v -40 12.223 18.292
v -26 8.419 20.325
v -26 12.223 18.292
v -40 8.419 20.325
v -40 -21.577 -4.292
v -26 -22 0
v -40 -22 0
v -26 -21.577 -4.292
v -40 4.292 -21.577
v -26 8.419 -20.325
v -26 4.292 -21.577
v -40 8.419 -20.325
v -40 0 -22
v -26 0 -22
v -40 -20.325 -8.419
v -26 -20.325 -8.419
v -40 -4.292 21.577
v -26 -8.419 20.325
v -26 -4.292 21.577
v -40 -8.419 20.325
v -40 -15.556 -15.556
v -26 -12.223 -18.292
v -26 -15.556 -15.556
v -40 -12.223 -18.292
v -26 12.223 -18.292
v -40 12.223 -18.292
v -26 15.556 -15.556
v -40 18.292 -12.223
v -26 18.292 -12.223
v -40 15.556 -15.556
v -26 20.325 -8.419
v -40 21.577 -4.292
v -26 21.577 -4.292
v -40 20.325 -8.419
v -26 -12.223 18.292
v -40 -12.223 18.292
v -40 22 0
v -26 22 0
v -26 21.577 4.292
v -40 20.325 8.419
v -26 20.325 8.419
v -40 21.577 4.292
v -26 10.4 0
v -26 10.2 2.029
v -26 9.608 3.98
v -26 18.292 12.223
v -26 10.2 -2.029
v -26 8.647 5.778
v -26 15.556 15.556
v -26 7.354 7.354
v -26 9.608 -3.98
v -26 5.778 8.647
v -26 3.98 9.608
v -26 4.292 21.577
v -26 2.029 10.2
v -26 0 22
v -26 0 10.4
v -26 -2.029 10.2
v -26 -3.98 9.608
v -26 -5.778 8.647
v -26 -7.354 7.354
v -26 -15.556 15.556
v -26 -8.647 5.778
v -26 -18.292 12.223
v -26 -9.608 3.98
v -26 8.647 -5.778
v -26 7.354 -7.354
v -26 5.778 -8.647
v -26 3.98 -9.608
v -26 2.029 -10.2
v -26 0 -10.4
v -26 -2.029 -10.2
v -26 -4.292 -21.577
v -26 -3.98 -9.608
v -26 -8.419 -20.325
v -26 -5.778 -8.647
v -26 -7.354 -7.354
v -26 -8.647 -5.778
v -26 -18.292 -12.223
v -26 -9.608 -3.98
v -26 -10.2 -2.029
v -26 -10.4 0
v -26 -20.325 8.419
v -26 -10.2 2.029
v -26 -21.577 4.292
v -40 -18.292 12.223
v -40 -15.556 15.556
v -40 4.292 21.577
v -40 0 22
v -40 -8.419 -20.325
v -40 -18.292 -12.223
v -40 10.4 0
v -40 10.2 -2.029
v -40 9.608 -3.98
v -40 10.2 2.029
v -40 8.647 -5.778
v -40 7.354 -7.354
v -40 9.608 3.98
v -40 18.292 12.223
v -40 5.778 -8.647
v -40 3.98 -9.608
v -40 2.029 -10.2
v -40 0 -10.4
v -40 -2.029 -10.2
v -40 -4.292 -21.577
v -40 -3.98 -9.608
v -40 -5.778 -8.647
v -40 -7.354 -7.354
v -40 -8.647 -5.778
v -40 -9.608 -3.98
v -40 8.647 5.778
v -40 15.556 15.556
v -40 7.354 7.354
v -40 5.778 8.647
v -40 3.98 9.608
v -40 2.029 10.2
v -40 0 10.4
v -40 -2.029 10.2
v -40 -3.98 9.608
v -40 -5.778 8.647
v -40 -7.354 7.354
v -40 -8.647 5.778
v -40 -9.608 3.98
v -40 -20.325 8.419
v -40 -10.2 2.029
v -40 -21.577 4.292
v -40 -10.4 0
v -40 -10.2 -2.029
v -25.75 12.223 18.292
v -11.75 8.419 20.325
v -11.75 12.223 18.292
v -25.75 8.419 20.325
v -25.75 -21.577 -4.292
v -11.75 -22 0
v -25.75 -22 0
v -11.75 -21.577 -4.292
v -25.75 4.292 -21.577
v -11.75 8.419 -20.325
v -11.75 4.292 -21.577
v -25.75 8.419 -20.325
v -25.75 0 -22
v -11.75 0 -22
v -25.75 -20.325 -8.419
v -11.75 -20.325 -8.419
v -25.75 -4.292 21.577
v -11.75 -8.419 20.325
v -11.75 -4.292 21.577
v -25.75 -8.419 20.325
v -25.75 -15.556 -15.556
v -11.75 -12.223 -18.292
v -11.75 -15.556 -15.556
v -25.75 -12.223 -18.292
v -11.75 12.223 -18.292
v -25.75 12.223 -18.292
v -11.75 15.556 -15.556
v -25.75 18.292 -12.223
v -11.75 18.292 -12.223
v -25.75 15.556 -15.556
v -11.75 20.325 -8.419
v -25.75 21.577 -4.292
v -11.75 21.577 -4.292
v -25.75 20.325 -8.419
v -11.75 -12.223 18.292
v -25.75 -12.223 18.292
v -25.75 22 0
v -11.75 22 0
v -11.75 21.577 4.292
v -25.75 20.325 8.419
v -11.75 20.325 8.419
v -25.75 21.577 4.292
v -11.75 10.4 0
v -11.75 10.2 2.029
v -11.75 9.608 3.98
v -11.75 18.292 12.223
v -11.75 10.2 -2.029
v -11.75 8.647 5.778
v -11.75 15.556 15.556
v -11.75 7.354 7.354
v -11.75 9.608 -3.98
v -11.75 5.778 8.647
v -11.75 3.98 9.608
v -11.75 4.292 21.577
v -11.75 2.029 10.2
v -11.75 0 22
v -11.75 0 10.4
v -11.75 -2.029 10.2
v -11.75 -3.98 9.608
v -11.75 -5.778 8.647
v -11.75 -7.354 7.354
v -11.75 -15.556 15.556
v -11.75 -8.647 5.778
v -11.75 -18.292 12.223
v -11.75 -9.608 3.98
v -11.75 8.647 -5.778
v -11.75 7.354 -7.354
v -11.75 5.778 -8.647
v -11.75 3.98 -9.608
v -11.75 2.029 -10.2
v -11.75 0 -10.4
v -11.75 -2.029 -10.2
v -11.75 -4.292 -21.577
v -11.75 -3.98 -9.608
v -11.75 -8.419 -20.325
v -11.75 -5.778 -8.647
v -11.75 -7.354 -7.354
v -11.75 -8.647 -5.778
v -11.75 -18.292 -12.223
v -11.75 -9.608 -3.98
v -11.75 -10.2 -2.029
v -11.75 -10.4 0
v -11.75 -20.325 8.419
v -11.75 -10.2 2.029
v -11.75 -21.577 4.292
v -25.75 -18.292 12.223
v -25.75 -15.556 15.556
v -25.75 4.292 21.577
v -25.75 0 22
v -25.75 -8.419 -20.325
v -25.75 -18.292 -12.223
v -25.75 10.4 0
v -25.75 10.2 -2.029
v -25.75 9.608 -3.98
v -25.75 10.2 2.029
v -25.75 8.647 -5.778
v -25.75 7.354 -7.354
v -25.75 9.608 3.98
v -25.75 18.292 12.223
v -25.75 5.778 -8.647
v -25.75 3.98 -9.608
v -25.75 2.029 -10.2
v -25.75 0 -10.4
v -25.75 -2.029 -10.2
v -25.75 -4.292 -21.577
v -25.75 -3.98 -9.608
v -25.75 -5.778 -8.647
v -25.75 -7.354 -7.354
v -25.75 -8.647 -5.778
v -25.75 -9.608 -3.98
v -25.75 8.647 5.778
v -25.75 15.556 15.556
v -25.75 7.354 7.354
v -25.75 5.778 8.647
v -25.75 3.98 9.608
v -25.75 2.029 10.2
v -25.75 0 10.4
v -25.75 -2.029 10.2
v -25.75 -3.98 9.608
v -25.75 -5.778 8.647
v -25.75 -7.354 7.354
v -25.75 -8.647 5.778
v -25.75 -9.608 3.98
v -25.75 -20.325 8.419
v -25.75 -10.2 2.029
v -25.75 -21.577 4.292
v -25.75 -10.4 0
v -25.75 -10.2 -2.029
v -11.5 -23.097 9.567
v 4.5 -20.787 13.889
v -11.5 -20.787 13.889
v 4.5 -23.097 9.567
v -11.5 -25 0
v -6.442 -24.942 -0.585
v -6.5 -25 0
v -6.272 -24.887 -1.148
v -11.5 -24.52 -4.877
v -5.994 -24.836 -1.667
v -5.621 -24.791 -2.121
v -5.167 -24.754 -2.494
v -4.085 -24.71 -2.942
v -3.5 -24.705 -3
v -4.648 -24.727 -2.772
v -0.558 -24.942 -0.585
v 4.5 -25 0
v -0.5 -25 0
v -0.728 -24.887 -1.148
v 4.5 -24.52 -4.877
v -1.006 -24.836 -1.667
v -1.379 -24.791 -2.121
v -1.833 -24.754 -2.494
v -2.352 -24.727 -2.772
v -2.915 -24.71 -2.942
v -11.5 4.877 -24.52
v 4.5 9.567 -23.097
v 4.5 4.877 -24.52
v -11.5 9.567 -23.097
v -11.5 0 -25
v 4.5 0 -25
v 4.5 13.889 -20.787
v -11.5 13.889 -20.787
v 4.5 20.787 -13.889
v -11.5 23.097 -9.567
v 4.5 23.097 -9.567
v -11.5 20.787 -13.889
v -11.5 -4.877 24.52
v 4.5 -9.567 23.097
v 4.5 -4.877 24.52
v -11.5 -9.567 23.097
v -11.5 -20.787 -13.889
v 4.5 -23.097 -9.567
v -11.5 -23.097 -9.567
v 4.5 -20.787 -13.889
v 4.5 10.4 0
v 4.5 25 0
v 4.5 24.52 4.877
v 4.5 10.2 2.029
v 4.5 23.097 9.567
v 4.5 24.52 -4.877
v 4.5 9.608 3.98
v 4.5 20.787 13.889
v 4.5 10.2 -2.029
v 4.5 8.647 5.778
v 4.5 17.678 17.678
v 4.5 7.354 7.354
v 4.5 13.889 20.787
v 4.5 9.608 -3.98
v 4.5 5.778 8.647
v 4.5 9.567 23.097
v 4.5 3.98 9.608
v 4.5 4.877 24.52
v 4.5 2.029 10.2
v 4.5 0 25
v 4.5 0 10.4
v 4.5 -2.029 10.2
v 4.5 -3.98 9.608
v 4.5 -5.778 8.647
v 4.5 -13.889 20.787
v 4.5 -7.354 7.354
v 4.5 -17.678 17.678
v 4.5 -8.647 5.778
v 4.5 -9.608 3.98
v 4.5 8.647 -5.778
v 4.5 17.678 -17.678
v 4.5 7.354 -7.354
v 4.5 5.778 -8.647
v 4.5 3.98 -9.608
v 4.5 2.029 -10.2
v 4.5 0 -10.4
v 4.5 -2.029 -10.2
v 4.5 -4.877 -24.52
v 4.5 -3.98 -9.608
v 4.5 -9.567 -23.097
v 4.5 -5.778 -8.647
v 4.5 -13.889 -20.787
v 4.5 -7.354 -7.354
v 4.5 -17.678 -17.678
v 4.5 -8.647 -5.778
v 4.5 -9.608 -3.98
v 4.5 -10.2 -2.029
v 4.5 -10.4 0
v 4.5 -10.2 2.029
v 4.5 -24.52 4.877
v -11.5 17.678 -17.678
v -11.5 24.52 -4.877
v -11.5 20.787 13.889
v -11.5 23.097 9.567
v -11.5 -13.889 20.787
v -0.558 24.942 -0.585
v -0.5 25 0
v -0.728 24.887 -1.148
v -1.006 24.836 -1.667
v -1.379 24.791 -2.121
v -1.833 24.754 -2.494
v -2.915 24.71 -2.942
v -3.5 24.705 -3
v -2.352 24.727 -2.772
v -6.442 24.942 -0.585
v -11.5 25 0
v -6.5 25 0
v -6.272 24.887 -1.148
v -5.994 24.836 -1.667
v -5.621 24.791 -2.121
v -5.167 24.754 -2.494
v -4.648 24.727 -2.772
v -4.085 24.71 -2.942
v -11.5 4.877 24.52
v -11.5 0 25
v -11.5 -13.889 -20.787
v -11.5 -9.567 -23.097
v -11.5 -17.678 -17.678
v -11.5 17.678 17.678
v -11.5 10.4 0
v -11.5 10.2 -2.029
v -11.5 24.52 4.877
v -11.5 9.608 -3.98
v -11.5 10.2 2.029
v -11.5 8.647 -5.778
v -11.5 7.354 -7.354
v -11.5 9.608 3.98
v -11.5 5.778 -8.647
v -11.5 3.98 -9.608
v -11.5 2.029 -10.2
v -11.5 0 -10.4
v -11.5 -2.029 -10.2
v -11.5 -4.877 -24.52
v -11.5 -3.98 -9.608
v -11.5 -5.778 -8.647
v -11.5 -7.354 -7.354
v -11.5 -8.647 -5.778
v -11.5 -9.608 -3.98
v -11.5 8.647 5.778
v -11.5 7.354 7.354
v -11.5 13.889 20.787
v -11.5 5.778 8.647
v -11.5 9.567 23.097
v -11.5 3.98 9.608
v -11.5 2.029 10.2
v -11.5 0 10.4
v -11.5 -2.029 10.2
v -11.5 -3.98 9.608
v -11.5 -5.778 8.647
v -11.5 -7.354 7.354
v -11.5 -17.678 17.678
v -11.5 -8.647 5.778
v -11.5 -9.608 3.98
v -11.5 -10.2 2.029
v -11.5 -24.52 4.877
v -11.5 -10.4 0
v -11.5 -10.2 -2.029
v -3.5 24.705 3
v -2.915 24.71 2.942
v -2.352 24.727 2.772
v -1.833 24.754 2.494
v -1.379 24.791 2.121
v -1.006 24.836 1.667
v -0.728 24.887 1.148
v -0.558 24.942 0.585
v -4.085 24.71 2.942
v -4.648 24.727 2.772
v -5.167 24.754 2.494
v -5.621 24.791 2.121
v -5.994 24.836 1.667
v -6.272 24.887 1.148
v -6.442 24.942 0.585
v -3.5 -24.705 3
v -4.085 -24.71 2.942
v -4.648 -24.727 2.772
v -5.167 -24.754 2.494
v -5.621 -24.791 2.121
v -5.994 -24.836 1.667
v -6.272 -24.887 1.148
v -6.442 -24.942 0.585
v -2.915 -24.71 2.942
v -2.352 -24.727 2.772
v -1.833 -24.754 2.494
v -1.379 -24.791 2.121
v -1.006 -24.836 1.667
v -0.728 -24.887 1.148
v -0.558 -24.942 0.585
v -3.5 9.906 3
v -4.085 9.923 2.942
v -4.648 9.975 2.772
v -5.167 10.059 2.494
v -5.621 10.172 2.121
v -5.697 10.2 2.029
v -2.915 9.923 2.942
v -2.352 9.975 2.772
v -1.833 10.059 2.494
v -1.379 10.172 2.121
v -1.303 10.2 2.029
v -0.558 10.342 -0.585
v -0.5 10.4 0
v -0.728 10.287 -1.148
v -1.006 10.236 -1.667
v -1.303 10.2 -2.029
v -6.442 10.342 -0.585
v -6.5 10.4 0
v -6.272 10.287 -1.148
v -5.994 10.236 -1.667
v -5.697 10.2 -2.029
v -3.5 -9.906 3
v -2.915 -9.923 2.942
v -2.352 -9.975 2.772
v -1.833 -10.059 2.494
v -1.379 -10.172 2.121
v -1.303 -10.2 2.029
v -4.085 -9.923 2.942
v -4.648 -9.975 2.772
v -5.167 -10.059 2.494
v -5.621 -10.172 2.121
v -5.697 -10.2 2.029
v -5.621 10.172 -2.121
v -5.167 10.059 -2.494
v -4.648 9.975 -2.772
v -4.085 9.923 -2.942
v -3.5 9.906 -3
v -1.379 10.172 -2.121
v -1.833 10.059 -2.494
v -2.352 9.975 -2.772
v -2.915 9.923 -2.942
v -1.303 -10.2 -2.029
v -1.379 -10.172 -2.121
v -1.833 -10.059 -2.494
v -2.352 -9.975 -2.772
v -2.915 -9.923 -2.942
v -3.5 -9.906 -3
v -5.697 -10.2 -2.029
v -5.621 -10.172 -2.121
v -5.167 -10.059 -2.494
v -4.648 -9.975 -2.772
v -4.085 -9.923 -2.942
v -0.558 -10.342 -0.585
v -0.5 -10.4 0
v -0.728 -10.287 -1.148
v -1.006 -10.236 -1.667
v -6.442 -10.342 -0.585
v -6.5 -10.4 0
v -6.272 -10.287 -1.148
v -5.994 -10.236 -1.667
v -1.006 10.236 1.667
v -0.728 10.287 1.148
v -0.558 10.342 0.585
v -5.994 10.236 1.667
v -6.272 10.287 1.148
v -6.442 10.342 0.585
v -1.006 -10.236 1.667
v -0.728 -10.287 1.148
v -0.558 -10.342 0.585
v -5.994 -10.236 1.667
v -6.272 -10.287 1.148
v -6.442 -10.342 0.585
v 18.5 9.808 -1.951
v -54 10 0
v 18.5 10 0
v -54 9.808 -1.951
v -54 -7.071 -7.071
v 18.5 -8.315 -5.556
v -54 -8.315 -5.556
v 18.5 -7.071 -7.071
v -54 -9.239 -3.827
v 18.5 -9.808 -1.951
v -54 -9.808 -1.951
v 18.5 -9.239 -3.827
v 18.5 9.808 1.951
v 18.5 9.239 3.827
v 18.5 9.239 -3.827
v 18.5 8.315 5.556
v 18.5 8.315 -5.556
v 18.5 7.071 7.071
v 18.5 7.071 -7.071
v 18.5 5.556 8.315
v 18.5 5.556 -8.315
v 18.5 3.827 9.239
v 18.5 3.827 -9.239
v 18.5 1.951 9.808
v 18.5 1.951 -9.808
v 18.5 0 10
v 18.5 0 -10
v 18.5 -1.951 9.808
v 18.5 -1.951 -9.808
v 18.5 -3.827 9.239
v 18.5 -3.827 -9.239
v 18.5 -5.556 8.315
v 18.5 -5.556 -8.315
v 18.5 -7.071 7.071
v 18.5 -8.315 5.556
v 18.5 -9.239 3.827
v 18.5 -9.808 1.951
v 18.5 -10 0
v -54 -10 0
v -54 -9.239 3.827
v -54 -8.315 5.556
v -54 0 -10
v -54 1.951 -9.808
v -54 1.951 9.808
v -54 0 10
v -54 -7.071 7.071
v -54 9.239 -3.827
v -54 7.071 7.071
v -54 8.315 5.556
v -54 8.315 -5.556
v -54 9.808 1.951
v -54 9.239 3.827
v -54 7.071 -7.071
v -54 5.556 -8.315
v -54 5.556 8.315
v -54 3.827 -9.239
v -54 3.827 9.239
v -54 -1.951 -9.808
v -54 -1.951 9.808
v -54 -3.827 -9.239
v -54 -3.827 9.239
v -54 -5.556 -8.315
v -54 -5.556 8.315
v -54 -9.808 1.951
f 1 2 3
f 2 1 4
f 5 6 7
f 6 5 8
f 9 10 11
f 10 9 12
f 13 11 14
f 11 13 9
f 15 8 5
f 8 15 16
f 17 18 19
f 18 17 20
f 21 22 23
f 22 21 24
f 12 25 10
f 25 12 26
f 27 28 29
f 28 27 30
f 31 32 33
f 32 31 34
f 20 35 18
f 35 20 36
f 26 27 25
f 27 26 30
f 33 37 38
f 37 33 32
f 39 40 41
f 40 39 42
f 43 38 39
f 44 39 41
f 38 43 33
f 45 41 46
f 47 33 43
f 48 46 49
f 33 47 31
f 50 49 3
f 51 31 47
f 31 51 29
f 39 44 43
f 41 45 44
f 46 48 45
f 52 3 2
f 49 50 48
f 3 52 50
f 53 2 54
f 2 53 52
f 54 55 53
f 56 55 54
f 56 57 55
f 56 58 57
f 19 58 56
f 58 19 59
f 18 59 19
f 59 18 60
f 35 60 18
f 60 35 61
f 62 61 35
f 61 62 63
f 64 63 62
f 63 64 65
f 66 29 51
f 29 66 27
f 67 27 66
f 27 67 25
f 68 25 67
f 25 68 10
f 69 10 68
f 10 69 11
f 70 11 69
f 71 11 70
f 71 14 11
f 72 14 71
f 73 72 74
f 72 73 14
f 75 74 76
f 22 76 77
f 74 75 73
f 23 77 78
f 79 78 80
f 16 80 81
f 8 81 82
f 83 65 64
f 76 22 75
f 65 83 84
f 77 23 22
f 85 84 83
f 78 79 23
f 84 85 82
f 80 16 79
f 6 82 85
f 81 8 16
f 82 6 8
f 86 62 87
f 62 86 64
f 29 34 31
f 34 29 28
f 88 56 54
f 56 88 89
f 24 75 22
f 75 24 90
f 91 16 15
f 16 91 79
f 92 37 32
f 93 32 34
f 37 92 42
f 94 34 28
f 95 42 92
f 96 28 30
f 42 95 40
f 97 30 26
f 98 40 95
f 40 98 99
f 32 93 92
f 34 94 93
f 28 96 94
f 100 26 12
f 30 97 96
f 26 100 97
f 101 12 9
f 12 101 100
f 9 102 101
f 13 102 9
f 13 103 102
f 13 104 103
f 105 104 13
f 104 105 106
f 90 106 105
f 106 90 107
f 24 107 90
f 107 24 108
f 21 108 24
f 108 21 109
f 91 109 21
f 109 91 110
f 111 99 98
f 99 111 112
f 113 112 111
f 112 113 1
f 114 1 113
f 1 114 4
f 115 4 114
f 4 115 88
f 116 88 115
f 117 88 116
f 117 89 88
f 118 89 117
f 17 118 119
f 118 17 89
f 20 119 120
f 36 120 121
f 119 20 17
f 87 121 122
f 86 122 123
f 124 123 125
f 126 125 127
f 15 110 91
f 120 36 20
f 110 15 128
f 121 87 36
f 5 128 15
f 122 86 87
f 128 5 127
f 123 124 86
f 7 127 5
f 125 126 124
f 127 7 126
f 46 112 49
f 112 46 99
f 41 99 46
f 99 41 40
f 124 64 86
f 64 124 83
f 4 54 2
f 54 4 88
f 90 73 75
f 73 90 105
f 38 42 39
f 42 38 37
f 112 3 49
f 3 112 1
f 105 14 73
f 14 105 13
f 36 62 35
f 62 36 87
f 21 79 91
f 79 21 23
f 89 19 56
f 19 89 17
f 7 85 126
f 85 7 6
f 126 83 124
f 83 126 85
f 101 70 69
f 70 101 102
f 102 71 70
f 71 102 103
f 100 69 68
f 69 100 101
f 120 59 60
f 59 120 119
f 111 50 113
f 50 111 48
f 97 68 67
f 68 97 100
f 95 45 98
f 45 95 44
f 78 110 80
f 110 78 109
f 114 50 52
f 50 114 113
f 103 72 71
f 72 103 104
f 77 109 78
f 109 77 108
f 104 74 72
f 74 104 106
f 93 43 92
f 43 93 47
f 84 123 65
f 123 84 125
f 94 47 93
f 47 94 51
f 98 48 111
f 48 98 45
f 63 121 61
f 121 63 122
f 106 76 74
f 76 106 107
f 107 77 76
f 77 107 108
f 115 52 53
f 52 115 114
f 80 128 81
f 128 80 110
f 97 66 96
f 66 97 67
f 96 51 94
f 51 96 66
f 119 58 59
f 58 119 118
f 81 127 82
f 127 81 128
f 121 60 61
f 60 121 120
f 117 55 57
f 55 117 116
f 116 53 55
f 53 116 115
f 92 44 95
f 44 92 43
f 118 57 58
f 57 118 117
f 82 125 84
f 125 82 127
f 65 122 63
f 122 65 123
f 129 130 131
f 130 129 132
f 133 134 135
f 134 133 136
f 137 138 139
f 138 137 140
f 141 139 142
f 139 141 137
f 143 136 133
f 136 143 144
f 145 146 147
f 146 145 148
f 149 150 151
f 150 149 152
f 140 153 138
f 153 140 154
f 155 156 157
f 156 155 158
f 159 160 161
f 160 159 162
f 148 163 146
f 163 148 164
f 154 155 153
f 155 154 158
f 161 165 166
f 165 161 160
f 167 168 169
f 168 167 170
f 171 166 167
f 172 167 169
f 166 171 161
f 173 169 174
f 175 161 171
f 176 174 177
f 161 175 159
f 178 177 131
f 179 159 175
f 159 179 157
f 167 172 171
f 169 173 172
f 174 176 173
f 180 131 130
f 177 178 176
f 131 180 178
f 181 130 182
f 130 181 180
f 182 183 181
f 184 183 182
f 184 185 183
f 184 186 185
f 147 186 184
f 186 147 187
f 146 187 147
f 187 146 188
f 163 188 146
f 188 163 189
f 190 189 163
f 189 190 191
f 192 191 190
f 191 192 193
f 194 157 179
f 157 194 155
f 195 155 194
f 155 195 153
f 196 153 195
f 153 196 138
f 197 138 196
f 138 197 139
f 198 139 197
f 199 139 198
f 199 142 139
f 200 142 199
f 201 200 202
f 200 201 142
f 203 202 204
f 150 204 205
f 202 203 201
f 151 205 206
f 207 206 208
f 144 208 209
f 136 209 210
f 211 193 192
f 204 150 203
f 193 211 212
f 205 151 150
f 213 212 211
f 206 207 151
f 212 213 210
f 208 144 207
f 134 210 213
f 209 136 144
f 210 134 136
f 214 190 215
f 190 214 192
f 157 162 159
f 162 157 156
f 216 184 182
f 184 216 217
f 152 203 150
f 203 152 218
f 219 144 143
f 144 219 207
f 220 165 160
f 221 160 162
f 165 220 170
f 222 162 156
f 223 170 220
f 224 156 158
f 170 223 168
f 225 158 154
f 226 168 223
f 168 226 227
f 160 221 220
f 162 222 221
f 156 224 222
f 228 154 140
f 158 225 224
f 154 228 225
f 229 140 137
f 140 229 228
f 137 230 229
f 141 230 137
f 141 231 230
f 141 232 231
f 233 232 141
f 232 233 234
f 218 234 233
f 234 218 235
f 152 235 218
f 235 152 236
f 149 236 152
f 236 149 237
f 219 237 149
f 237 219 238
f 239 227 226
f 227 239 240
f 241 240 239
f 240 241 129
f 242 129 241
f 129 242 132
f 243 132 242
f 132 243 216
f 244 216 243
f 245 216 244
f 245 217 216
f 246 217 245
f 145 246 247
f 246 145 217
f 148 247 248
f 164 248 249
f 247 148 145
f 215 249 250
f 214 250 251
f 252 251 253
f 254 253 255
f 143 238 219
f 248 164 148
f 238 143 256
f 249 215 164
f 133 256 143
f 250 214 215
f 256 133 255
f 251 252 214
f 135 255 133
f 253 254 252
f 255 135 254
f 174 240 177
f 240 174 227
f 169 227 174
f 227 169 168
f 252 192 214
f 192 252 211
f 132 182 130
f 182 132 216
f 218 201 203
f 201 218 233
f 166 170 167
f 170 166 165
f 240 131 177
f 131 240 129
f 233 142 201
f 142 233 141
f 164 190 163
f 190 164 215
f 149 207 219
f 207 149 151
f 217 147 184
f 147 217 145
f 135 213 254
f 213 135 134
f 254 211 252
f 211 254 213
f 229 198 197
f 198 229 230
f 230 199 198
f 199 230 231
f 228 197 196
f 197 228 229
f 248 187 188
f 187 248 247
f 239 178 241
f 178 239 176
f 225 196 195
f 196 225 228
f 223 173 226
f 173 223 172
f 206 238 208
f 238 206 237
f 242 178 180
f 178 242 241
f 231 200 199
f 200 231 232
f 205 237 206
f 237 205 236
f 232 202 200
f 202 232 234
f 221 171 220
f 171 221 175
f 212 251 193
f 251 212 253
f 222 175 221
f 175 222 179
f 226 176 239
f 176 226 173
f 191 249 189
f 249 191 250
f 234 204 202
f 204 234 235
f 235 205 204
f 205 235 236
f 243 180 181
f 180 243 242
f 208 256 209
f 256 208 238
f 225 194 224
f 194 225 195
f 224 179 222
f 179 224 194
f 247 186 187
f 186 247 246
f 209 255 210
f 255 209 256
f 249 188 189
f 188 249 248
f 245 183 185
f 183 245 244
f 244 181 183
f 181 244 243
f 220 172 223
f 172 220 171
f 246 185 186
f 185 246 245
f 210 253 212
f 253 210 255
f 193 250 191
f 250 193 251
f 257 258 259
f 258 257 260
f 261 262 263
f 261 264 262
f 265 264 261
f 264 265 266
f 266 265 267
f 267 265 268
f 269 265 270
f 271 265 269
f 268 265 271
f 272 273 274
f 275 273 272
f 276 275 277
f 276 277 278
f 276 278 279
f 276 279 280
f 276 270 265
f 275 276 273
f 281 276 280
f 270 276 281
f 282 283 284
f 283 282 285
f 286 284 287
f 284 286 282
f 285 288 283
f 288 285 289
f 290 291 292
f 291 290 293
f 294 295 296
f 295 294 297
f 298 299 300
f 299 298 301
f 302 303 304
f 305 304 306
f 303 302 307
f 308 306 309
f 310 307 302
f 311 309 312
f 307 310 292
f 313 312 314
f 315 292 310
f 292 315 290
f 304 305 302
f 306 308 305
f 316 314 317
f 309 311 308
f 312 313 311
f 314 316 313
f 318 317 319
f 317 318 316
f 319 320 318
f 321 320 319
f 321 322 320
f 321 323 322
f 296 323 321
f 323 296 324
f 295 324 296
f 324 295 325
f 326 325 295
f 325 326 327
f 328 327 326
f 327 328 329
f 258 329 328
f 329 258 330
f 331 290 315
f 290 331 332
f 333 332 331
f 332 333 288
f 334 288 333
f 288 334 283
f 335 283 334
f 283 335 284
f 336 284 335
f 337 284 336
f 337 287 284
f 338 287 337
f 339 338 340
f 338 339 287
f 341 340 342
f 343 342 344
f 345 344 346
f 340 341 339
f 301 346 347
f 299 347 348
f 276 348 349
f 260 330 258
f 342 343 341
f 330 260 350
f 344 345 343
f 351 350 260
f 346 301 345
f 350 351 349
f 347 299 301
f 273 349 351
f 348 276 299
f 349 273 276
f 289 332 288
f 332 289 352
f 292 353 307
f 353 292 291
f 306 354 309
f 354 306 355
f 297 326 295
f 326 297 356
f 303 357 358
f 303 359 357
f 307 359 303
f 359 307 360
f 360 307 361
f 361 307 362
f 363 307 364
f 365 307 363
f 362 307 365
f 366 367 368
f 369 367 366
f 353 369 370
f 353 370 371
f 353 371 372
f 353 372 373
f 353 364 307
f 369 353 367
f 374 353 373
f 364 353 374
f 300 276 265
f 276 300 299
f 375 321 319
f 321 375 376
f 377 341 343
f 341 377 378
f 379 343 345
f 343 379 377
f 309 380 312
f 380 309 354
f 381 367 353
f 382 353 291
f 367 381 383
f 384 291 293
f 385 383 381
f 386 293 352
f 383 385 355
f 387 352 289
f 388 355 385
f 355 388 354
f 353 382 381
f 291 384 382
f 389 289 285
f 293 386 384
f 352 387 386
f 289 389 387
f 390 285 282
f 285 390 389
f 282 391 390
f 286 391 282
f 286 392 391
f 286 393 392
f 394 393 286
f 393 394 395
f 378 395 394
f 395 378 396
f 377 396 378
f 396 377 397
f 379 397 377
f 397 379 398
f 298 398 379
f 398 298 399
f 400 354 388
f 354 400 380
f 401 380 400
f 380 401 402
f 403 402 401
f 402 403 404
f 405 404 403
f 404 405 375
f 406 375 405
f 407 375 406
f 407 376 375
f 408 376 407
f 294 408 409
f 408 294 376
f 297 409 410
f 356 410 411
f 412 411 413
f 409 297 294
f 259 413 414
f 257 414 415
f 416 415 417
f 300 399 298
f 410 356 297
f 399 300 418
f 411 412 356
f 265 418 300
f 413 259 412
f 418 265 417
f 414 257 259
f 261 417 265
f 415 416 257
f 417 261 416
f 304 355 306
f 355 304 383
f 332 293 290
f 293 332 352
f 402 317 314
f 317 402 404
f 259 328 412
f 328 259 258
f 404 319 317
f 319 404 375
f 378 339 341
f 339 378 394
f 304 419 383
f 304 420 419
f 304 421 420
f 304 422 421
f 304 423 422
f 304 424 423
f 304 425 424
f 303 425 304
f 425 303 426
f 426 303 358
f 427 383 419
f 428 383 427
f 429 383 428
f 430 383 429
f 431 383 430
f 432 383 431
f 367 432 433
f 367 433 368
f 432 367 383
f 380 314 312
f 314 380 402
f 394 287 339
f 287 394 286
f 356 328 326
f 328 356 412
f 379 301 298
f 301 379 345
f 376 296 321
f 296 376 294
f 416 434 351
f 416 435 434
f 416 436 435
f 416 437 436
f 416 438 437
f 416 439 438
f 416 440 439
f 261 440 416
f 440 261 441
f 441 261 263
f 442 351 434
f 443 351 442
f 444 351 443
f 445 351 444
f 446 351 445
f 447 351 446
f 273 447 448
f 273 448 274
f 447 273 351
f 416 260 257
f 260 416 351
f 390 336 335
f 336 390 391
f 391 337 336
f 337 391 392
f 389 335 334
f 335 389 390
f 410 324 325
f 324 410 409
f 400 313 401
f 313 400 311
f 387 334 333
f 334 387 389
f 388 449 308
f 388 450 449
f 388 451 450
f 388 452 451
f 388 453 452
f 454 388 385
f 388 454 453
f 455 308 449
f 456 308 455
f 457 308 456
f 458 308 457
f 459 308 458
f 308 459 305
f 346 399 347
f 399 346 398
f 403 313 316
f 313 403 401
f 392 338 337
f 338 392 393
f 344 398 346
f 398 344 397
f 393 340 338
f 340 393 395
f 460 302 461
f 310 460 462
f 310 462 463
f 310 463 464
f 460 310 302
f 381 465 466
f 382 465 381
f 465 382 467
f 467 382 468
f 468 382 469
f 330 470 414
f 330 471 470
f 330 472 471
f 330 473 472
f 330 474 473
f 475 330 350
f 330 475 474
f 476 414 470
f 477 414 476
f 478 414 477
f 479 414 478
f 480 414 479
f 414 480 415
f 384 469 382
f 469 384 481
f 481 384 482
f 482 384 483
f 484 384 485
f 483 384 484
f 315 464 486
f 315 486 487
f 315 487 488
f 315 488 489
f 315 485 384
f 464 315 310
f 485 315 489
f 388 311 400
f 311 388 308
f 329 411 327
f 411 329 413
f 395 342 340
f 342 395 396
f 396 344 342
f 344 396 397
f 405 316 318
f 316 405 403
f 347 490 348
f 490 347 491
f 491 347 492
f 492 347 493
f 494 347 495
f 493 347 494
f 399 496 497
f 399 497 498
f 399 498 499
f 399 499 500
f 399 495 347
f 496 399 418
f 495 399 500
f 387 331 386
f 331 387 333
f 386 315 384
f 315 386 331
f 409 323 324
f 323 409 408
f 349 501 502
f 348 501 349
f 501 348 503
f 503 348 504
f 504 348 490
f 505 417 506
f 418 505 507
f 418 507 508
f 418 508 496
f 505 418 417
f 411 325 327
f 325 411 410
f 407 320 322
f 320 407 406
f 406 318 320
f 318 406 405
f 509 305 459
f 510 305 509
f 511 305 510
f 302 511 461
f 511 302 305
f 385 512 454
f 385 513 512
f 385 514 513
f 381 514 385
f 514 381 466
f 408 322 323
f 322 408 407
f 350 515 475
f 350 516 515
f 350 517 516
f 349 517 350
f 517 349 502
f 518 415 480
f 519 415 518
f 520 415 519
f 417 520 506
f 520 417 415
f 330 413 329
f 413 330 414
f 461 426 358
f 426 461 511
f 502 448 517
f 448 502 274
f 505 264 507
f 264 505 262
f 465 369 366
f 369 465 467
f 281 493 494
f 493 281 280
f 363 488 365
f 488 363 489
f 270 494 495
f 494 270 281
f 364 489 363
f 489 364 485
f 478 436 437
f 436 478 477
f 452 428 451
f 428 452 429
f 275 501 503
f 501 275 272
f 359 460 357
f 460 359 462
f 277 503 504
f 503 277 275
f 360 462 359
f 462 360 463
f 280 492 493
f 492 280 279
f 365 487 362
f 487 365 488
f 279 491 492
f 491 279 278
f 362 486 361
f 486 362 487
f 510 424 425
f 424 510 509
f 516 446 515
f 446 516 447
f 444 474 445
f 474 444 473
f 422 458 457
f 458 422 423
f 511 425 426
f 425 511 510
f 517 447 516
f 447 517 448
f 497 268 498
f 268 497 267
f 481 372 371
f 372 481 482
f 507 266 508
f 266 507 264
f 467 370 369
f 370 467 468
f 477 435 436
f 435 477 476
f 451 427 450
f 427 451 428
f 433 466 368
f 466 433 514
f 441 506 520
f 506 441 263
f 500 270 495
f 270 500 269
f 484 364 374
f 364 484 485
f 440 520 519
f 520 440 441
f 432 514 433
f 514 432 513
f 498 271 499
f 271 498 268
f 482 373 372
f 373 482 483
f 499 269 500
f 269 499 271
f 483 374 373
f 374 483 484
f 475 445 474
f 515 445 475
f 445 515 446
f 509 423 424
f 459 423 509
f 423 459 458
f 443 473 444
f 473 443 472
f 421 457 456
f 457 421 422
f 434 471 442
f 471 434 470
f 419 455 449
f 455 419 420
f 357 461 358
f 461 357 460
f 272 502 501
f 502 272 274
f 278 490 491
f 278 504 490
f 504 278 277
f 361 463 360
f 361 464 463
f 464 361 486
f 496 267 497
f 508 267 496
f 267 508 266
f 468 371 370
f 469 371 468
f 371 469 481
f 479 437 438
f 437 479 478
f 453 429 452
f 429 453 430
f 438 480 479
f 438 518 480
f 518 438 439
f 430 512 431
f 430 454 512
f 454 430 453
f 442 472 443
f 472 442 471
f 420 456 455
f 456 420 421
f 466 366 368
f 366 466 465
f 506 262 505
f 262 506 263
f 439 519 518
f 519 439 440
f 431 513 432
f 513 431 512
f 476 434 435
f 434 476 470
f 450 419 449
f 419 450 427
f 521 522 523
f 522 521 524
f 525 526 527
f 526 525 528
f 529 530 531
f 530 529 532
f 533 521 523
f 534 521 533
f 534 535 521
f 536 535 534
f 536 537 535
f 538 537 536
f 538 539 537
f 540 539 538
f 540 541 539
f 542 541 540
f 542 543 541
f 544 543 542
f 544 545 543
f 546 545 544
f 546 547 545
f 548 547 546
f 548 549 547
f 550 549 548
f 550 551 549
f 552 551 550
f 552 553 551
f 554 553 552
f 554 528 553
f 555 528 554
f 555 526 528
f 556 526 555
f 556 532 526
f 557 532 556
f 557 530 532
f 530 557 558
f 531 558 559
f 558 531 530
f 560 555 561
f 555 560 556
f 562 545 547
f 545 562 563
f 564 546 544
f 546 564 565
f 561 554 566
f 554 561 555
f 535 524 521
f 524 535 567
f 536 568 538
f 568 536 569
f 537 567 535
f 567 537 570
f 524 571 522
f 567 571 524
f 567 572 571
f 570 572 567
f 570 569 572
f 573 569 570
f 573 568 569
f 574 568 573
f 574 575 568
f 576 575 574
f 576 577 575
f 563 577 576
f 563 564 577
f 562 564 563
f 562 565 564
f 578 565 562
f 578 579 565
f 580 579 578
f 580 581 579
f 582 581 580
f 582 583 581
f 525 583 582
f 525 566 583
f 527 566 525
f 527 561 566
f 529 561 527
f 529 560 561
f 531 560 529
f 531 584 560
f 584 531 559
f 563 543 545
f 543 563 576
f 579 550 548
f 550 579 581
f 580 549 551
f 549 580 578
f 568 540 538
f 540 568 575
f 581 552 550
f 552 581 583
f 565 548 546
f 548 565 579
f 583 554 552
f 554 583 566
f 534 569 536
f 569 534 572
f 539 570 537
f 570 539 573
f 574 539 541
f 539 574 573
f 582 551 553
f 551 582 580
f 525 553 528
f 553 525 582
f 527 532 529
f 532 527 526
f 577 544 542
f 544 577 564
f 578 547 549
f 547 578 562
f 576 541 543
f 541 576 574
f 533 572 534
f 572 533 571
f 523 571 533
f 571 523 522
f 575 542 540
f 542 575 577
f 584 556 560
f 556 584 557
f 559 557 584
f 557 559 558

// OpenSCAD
$fn = 32;

// ------------------------------------------------------------------------
// Shaft with rings and collars: d20 shaft, 3 rings
// Every part is its own module, assembly() places them once.
// ------------------------------------------------------------------------

// --- part 1 ---
module shaft() {
  translate([0, 0, -36.25]) cylinder(h = 72.5, d = 20);
}

// --- part 2 ---
module spacer_a() {
  difference() {
      translate([0, 0, 0]) cylinder(h = 14, d = 44);
      translate([0, 0, -1]) cylinder(h = 16, d = 20.8);
    }
}

// --- part 3 ---
module spacer_b() {
  difference() {
      translate([0, 0, 0]) cylinder(h = 14, d = 44);
      translate([0, 0, -1]) cylinder(h = 16, d = 20.8);
    }
}

// --- part 4 ---
module collar_a() {
  difference() {
    cylinder(h = 16, d = 50);
    translate([0, 0, -1]) cylinder(h = 18, d = 20.8);
    translate([0, 0, 8]) rotate([90, 0, 0]) cylinder(h = 52, d = 6, center = true);
  }
}

// --- assembly ---
module assembly() {
  translate([-17.75, 0, 0]) rotate([0, 90, 0]) shaft();
  translate([-40, 0, 0]) rotate([0, 90, 0]) spacer_a();
  translate([-25.75, 0, 0]) rotate([0, 90, 0]) spacer_b();
  translate([-11.5, 0, 0]) rotate([0, 90, 0]) collar_a();
}

assembly();
